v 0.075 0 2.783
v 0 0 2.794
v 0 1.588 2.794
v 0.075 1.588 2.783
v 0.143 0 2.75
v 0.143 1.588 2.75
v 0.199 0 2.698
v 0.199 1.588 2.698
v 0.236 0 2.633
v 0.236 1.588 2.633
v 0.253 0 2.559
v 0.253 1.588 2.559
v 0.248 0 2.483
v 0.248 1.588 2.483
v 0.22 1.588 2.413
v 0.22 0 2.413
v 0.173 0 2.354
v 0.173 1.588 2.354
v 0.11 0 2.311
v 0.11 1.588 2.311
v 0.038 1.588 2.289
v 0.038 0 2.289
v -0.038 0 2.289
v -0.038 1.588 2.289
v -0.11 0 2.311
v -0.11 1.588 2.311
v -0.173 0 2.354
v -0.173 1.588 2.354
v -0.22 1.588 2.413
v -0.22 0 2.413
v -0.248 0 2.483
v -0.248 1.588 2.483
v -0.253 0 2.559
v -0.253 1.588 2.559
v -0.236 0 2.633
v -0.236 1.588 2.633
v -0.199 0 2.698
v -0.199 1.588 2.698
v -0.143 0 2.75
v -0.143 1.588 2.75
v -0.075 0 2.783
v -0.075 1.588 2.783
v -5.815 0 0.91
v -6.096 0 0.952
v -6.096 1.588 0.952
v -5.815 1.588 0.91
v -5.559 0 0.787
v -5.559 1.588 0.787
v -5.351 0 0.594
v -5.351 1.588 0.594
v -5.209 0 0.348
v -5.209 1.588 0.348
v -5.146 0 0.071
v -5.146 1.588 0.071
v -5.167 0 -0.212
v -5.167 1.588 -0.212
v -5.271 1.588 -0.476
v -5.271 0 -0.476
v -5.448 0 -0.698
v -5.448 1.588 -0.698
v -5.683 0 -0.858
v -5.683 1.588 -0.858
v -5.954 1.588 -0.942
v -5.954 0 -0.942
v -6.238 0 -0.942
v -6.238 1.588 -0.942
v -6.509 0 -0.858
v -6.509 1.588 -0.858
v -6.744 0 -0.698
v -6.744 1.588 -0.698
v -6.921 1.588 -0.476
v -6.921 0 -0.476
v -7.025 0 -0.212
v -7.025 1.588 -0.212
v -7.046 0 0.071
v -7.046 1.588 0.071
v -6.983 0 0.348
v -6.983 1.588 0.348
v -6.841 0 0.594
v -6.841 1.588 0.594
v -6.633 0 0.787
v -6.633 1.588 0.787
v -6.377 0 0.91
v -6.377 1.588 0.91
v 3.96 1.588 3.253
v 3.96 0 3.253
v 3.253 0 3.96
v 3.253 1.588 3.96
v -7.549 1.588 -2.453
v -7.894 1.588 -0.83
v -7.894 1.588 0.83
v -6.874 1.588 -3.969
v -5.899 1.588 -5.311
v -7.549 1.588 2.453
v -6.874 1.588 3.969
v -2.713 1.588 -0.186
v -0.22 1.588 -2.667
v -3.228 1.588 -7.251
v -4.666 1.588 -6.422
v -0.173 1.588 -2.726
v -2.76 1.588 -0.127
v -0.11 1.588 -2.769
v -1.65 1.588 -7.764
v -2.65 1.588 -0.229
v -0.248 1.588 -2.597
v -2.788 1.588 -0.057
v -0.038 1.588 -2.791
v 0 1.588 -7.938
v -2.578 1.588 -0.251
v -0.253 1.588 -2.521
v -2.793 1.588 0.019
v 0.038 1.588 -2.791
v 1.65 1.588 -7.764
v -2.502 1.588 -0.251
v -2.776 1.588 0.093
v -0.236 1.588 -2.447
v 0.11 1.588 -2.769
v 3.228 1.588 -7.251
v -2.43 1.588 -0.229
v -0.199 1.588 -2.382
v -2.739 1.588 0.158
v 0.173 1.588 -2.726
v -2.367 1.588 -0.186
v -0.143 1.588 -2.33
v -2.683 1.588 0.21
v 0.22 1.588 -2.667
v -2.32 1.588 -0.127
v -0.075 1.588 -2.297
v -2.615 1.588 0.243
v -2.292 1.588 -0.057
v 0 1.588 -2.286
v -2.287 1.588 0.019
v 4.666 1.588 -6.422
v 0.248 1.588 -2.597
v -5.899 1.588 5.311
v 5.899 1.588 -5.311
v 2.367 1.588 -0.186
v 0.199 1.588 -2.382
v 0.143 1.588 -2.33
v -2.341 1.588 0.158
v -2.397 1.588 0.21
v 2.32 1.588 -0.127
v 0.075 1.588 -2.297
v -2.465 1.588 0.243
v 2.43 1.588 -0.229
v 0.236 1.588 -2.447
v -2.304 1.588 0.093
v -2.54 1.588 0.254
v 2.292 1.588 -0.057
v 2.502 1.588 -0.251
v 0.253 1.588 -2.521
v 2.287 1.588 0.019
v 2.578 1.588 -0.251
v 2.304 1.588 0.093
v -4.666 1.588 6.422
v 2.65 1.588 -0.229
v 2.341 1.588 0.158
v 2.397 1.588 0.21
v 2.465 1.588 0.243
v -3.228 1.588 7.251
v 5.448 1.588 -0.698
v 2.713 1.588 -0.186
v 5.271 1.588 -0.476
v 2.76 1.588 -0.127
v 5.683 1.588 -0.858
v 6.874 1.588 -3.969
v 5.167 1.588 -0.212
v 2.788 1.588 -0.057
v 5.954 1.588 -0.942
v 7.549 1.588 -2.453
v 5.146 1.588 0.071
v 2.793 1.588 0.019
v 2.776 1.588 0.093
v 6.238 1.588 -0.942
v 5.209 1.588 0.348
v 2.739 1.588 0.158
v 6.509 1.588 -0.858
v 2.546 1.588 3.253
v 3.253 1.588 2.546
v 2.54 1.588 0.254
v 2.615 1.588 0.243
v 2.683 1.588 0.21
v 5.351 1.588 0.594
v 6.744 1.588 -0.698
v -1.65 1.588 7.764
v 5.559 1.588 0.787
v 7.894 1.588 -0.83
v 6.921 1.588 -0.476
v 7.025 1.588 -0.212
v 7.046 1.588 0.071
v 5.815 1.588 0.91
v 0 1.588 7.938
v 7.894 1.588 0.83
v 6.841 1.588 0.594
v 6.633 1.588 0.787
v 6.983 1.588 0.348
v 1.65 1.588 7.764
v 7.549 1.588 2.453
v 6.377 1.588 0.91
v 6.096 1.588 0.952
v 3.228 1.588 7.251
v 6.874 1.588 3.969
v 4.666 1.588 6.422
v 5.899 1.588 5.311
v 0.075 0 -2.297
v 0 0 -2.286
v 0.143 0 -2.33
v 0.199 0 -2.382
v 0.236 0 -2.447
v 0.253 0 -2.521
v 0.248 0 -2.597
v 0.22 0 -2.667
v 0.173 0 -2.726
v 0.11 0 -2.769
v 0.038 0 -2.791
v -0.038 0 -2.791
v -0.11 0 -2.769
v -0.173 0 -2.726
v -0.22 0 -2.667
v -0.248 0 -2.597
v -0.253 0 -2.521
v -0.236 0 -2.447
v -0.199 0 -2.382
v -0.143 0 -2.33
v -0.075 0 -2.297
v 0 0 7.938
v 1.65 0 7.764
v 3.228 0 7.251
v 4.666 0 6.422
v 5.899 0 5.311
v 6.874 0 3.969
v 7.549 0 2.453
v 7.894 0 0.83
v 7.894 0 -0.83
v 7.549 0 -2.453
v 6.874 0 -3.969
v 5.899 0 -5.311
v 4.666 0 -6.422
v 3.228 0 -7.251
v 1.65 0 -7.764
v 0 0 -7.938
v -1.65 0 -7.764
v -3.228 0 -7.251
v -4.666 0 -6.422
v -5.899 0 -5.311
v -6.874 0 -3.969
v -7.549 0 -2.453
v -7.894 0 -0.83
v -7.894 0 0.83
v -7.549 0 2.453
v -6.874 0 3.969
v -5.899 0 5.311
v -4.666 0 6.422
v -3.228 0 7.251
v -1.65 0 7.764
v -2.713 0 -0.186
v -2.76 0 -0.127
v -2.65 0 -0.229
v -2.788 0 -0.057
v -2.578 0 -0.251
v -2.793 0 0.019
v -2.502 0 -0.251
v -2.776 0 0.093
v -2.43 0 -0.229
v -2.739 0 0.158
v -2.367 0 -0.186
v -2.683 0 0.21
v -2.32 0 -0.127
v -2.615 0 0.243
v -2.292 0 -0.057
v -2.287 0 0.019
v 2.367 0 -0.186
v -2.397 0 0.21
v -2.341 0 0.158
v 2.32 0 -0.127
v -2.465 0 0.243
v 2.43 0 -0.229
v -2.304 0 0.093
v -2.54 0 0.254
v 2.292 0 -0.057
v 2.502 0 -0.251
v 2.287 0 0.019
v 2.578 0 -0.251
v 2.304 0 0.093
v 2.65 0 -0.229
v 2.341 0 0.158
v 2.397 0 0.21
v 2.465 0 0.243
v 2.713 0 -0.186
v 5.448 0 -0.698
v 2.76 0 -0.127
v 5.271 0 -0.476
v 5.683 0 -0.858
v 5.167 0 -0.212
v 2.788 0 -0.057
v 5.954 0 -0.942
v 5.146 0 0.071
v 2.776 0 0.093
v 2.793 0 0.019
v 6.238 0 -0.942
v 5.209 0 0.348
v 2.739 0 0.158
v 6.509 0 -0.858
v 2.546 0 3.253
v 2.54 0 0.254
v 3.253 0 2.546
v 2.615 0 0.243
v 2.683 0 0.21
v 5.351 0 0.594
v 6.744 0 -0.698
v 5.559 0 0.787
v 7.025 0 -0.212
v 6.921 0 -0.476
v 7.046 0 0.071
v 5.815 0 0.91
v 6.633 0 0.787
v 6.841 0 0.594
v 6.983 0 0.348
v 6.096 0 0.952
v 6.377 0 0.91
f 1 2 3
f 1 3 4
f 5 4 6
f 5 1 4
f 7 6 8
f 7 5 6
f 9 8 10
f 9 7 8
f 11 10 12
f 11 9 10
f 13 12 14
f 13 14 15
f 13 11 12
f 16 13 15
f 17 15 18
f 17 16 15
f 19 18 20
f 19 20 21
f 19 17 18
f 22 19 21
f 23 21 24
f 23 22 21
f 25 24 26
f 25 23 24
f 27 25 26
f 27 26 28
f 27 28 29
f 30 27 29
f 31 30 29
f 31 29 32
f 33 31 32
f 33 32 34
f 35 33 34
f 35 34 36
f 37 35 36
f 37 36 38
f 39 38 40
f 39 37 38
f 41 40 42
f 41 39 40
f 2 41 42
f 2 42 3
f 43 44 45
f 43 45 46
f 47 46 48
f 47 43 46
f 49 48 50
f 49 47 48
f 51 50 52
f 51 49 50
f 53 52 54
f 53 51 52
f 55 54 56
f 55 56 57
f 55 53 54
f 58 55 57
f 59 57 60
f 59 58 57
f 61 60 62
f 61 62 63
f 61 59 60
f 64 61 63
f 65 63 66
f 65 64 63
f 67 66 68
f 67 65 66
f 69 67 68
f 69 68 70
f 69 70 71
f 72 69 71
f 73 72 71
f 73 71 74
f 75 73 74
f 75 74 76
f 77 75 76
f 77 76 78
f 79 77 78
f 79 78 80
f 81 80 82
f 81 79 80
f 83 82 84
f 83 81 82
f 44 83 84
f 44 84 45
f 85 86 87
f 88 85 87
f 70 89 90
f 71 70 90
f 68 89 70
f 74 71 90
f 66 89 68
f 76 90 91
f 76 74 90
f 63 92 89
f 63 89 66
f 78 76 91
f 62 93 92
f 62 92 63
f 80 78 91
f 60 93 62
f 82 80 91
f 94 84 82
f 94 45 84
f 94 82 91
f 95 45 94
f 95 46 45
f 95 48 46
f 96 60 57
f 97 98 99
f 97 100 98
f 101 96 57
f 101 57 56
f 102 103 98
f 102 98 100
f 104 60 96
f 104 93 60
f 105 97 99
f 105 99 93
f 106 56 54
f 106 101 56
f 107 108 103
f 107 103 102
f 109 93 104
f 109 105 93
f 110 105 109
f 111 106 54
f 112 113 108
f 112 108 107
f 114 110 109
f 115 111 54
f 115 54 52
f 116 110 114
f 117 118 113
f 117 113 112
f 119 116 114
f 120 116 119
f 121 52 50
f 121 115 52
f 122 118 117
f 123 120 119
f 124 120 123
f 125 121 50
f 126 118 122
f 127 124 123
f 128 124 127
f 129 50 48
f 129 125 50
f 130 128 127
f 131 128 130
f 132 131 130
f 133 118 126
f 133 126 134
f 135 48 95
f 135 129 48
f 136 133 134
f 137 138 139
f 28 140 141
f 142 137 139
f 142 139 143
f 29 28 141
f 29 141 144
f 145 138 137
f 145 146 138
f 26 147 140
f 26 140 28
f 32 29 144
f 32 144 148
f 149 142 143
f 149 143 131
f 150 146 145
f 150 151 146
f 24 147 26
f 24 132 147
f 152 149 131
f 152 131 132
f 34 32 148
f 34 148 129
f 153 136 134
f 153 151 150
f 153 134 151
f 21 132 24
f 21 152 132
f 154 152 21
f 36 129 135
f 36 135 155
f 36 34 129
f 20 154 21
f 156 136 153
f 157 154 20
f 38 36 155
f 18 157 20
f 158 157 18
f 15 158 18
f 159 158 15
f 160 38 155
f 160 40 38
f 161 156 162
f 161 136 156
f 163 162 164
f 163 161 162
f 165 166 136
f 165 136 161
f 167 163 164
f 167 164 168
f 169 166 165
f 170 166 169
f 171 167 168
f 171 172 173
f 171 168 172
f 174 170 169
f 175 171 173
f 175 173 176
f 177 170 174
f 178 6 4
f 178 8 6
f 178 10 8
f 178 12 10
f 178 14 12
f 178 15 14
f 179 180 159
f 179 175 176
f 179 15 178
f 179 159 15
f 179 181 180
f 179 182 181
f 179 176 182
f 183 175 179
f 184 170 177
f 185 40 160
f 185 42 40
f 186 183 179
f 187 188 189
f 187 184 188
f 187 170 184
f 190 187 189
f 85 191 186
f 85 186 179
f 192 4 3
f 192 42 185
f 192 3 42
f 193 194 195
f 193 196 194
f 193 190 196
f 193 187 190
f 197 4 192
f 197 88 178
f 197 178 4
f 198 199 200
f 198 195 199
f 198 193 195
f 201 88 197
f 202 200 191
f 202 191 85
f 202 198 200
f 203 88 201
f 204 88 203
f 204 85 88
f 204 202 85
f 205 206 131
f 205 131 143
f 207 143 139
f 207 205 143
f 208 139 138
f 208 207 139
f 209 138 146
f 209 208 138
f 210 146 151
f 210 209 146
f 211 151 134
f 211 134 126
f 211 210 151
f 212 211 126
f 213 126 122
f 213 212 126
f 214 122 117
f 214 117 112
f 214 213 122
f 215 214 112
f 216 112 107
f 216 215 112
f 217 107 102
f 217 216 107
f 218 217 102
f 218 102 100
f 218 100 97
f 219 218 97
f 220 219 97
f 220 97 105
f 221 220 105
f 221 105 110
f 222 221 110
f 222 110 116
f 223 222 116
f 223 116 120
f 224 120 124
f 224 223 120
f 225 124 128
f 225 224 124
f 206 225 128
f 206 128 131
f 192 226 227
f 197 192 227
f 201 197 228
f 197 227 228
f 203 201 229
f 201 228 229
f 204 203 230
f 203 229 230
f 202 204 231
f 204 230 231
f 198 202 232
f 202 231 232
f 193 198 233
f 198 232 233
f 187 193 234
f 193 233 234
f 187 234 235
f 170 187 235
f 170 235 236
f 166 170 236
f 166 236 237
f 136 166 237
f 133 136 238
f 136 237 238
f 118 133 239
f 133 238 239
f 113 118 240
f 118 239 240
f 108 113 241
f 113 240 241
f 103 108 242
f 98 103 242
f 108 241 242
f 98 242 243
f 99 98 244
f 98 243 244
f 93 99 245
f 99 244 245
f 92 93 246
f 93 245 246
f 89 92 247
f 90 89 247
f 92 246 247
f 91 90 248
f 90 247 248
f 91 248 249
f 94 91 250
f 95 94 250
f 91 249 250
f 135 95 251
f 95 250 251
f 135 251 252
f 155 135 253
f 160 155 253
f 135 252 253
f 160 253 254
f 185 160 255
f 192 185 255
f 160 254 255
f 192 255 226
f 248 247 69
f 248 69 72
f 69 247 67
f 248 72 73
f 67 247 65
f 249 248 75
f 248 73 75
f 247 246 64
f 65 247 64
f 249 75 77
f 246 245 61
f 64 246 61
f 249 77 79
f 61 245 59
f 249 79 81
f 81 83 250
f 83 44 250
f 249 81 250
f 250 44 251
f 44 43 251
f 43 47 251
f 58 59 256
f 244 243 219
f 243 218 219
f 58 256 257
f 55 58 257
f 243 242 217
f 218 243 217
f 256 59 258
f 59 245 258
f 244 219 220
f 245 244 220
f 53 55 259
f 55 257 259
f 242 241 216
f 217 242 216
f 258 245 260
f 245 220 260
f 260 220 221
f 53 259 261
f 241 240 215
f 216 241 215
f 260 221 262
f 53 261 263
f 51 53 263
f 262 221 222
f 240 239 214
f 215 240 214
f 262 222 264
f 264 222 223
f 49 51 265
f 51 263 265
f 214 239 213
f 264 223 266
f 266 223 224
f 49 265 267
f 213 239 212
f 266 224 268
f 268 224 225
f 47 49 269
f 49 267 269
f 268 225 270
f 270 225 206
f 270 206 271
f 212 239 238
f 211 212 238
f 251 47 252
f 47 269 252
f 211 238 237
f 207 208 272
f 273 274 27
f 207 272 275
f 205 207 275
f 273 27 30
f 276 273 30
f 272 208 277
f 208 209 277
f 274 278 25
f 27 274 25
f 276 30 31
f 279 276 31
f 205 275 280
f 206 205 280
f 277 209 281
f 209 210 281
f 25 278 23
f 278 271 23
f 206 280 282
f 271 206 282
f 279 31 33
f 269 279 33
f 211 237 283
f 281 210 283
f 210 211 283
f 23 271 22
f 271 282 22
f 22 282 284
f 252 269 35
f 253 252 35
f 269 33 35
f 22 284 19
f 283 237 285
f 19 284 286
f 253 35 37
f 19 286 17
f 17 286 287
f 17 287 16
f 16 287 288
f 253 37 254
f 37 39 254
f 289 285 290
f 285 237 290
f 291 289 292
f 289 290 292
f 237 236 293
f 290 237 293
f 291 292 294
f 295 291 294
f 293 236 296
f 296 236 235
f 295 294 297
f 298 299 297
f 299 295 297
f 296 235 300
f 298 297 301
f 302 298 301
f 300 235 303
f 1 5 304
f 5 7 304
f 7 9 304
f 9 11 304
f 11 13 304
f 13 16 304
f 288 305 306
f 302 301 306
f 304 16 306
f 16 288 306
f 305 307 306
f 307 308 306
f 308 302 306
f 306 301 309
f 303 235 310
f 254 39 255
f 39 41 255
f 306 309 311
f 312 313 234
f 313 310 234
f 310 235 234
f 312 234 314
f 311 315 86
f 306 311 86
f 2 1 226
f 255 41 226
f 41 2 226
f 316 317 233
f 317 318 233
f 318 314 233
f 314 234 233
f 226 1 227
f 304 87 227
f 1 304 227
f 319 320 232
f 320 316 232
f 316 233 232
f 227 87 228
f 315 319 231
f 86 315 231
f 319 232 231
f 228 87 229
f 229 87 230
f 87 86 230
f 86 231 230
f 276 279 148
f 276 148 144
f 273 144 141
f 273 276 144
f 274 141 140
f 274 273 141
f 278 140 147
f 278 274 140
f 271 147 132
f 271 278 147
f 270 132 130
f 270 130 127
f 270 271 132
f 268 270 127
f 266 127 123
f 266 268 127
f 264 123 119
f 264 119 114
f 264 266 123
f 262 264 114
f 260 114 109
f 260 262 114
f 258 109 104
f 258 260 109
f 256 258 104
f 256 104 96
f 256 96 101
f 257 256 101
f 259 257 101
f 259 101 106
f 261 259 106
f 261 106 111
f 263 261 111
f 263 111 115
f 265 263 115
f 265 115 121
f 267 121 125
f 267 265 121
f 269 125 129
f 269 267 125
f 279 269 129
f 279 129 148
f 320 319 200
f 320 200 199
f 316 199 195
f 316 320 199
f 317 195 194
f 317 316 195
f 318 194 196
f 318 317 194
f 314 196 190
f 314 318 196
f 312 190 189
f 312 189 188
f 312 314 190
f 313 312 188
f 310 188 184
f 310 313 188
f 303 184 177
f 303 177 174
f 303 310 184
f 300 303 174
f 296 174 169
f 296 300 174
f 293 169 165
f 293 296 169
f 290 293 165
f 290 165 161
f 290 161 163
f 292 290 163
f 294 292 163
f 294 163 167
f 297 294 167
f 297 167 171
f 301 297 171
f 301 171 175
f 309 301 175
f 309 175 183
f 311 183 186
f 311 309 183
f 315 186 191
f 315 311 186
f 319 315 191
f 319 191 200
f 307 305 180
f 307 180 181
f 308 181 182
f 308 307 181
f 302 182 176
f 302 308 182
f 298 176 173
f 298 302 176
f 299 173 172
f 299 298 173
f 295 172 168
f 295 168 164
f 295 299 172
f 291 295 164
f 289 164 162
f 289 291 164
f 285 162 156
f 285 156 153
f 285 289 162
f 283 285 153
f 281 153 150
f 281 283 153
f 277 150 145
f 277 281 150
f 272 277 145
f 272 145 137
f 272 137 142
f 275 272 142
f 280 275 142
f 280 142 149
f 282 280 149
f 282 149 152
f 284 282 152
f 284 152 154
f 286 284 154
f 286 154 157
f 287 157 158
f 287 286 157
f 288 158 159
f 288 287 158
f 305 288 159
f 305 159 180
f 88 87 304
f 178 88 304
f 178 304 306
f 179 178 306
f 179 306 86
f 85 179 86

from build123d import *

# Parameters (mm, degrees)
SKETCH1_R           = 7.9375
SKETCH1_R_2         = 0.9525
SKETCH1_R_3         = 0.254
BOSS_EXTRUDE1_DEPTH = 1.5875


with BuildPart() as part:
    # Sketch1 → Boss-Extrude1 (new body)
    with BuildSketch(Plane(origin=(0, 0, 0), x_dir=(1, 0, 0), z_dir=(0, 1, 0))):
        with Locations(Location((0, 0, 0), (0, 0, 270))):
            Circle(SKETCH1_R)
        with Locations(Location((-6.096, 0, 0), (0, 0, 270))):
            Circle(SKETCH1_R_2, mode=Mode.SUBTRACT)
        with Locations(Location((6.096, 0, 0), (0, 0, 270))):
            Circle(SKETCH1_R_2, mode=Mode.SUBTRACT)
        with Locations(Location((0, 2.54, 0), (0, 0, 270))):
            Circle(SKETCH1_R_3, mode=Mode.SUBTRACT)
        with Locations(Location((-2.54, 0, 0), (0, 0, 270))):
            Circle(SKETCH1_R_3, mode=Mode.SUBTRACT)
        with Locations(Location((0, -2.54, 0), (0, 0, 270))):
            Circle(SKETCH1_R_3, mode=Mode.SUBTRACT)
        with Locations(Location((2.54, 0, 0), (0, 0, 270))):
            Circle(SKETCH1_R_3, mode=Mode.SUBTRACT)
        Polygon((3.252691193, -2.545584412), (3.959797975, -3.252691193), (3.252691193, -3.959797975), (2.545584412, -3.252691193), align=None, mode=Mode.SUBTRACT)
    extrude(amount=BOSS_EXTRUDE1_DEPTH)


solid = part.part
